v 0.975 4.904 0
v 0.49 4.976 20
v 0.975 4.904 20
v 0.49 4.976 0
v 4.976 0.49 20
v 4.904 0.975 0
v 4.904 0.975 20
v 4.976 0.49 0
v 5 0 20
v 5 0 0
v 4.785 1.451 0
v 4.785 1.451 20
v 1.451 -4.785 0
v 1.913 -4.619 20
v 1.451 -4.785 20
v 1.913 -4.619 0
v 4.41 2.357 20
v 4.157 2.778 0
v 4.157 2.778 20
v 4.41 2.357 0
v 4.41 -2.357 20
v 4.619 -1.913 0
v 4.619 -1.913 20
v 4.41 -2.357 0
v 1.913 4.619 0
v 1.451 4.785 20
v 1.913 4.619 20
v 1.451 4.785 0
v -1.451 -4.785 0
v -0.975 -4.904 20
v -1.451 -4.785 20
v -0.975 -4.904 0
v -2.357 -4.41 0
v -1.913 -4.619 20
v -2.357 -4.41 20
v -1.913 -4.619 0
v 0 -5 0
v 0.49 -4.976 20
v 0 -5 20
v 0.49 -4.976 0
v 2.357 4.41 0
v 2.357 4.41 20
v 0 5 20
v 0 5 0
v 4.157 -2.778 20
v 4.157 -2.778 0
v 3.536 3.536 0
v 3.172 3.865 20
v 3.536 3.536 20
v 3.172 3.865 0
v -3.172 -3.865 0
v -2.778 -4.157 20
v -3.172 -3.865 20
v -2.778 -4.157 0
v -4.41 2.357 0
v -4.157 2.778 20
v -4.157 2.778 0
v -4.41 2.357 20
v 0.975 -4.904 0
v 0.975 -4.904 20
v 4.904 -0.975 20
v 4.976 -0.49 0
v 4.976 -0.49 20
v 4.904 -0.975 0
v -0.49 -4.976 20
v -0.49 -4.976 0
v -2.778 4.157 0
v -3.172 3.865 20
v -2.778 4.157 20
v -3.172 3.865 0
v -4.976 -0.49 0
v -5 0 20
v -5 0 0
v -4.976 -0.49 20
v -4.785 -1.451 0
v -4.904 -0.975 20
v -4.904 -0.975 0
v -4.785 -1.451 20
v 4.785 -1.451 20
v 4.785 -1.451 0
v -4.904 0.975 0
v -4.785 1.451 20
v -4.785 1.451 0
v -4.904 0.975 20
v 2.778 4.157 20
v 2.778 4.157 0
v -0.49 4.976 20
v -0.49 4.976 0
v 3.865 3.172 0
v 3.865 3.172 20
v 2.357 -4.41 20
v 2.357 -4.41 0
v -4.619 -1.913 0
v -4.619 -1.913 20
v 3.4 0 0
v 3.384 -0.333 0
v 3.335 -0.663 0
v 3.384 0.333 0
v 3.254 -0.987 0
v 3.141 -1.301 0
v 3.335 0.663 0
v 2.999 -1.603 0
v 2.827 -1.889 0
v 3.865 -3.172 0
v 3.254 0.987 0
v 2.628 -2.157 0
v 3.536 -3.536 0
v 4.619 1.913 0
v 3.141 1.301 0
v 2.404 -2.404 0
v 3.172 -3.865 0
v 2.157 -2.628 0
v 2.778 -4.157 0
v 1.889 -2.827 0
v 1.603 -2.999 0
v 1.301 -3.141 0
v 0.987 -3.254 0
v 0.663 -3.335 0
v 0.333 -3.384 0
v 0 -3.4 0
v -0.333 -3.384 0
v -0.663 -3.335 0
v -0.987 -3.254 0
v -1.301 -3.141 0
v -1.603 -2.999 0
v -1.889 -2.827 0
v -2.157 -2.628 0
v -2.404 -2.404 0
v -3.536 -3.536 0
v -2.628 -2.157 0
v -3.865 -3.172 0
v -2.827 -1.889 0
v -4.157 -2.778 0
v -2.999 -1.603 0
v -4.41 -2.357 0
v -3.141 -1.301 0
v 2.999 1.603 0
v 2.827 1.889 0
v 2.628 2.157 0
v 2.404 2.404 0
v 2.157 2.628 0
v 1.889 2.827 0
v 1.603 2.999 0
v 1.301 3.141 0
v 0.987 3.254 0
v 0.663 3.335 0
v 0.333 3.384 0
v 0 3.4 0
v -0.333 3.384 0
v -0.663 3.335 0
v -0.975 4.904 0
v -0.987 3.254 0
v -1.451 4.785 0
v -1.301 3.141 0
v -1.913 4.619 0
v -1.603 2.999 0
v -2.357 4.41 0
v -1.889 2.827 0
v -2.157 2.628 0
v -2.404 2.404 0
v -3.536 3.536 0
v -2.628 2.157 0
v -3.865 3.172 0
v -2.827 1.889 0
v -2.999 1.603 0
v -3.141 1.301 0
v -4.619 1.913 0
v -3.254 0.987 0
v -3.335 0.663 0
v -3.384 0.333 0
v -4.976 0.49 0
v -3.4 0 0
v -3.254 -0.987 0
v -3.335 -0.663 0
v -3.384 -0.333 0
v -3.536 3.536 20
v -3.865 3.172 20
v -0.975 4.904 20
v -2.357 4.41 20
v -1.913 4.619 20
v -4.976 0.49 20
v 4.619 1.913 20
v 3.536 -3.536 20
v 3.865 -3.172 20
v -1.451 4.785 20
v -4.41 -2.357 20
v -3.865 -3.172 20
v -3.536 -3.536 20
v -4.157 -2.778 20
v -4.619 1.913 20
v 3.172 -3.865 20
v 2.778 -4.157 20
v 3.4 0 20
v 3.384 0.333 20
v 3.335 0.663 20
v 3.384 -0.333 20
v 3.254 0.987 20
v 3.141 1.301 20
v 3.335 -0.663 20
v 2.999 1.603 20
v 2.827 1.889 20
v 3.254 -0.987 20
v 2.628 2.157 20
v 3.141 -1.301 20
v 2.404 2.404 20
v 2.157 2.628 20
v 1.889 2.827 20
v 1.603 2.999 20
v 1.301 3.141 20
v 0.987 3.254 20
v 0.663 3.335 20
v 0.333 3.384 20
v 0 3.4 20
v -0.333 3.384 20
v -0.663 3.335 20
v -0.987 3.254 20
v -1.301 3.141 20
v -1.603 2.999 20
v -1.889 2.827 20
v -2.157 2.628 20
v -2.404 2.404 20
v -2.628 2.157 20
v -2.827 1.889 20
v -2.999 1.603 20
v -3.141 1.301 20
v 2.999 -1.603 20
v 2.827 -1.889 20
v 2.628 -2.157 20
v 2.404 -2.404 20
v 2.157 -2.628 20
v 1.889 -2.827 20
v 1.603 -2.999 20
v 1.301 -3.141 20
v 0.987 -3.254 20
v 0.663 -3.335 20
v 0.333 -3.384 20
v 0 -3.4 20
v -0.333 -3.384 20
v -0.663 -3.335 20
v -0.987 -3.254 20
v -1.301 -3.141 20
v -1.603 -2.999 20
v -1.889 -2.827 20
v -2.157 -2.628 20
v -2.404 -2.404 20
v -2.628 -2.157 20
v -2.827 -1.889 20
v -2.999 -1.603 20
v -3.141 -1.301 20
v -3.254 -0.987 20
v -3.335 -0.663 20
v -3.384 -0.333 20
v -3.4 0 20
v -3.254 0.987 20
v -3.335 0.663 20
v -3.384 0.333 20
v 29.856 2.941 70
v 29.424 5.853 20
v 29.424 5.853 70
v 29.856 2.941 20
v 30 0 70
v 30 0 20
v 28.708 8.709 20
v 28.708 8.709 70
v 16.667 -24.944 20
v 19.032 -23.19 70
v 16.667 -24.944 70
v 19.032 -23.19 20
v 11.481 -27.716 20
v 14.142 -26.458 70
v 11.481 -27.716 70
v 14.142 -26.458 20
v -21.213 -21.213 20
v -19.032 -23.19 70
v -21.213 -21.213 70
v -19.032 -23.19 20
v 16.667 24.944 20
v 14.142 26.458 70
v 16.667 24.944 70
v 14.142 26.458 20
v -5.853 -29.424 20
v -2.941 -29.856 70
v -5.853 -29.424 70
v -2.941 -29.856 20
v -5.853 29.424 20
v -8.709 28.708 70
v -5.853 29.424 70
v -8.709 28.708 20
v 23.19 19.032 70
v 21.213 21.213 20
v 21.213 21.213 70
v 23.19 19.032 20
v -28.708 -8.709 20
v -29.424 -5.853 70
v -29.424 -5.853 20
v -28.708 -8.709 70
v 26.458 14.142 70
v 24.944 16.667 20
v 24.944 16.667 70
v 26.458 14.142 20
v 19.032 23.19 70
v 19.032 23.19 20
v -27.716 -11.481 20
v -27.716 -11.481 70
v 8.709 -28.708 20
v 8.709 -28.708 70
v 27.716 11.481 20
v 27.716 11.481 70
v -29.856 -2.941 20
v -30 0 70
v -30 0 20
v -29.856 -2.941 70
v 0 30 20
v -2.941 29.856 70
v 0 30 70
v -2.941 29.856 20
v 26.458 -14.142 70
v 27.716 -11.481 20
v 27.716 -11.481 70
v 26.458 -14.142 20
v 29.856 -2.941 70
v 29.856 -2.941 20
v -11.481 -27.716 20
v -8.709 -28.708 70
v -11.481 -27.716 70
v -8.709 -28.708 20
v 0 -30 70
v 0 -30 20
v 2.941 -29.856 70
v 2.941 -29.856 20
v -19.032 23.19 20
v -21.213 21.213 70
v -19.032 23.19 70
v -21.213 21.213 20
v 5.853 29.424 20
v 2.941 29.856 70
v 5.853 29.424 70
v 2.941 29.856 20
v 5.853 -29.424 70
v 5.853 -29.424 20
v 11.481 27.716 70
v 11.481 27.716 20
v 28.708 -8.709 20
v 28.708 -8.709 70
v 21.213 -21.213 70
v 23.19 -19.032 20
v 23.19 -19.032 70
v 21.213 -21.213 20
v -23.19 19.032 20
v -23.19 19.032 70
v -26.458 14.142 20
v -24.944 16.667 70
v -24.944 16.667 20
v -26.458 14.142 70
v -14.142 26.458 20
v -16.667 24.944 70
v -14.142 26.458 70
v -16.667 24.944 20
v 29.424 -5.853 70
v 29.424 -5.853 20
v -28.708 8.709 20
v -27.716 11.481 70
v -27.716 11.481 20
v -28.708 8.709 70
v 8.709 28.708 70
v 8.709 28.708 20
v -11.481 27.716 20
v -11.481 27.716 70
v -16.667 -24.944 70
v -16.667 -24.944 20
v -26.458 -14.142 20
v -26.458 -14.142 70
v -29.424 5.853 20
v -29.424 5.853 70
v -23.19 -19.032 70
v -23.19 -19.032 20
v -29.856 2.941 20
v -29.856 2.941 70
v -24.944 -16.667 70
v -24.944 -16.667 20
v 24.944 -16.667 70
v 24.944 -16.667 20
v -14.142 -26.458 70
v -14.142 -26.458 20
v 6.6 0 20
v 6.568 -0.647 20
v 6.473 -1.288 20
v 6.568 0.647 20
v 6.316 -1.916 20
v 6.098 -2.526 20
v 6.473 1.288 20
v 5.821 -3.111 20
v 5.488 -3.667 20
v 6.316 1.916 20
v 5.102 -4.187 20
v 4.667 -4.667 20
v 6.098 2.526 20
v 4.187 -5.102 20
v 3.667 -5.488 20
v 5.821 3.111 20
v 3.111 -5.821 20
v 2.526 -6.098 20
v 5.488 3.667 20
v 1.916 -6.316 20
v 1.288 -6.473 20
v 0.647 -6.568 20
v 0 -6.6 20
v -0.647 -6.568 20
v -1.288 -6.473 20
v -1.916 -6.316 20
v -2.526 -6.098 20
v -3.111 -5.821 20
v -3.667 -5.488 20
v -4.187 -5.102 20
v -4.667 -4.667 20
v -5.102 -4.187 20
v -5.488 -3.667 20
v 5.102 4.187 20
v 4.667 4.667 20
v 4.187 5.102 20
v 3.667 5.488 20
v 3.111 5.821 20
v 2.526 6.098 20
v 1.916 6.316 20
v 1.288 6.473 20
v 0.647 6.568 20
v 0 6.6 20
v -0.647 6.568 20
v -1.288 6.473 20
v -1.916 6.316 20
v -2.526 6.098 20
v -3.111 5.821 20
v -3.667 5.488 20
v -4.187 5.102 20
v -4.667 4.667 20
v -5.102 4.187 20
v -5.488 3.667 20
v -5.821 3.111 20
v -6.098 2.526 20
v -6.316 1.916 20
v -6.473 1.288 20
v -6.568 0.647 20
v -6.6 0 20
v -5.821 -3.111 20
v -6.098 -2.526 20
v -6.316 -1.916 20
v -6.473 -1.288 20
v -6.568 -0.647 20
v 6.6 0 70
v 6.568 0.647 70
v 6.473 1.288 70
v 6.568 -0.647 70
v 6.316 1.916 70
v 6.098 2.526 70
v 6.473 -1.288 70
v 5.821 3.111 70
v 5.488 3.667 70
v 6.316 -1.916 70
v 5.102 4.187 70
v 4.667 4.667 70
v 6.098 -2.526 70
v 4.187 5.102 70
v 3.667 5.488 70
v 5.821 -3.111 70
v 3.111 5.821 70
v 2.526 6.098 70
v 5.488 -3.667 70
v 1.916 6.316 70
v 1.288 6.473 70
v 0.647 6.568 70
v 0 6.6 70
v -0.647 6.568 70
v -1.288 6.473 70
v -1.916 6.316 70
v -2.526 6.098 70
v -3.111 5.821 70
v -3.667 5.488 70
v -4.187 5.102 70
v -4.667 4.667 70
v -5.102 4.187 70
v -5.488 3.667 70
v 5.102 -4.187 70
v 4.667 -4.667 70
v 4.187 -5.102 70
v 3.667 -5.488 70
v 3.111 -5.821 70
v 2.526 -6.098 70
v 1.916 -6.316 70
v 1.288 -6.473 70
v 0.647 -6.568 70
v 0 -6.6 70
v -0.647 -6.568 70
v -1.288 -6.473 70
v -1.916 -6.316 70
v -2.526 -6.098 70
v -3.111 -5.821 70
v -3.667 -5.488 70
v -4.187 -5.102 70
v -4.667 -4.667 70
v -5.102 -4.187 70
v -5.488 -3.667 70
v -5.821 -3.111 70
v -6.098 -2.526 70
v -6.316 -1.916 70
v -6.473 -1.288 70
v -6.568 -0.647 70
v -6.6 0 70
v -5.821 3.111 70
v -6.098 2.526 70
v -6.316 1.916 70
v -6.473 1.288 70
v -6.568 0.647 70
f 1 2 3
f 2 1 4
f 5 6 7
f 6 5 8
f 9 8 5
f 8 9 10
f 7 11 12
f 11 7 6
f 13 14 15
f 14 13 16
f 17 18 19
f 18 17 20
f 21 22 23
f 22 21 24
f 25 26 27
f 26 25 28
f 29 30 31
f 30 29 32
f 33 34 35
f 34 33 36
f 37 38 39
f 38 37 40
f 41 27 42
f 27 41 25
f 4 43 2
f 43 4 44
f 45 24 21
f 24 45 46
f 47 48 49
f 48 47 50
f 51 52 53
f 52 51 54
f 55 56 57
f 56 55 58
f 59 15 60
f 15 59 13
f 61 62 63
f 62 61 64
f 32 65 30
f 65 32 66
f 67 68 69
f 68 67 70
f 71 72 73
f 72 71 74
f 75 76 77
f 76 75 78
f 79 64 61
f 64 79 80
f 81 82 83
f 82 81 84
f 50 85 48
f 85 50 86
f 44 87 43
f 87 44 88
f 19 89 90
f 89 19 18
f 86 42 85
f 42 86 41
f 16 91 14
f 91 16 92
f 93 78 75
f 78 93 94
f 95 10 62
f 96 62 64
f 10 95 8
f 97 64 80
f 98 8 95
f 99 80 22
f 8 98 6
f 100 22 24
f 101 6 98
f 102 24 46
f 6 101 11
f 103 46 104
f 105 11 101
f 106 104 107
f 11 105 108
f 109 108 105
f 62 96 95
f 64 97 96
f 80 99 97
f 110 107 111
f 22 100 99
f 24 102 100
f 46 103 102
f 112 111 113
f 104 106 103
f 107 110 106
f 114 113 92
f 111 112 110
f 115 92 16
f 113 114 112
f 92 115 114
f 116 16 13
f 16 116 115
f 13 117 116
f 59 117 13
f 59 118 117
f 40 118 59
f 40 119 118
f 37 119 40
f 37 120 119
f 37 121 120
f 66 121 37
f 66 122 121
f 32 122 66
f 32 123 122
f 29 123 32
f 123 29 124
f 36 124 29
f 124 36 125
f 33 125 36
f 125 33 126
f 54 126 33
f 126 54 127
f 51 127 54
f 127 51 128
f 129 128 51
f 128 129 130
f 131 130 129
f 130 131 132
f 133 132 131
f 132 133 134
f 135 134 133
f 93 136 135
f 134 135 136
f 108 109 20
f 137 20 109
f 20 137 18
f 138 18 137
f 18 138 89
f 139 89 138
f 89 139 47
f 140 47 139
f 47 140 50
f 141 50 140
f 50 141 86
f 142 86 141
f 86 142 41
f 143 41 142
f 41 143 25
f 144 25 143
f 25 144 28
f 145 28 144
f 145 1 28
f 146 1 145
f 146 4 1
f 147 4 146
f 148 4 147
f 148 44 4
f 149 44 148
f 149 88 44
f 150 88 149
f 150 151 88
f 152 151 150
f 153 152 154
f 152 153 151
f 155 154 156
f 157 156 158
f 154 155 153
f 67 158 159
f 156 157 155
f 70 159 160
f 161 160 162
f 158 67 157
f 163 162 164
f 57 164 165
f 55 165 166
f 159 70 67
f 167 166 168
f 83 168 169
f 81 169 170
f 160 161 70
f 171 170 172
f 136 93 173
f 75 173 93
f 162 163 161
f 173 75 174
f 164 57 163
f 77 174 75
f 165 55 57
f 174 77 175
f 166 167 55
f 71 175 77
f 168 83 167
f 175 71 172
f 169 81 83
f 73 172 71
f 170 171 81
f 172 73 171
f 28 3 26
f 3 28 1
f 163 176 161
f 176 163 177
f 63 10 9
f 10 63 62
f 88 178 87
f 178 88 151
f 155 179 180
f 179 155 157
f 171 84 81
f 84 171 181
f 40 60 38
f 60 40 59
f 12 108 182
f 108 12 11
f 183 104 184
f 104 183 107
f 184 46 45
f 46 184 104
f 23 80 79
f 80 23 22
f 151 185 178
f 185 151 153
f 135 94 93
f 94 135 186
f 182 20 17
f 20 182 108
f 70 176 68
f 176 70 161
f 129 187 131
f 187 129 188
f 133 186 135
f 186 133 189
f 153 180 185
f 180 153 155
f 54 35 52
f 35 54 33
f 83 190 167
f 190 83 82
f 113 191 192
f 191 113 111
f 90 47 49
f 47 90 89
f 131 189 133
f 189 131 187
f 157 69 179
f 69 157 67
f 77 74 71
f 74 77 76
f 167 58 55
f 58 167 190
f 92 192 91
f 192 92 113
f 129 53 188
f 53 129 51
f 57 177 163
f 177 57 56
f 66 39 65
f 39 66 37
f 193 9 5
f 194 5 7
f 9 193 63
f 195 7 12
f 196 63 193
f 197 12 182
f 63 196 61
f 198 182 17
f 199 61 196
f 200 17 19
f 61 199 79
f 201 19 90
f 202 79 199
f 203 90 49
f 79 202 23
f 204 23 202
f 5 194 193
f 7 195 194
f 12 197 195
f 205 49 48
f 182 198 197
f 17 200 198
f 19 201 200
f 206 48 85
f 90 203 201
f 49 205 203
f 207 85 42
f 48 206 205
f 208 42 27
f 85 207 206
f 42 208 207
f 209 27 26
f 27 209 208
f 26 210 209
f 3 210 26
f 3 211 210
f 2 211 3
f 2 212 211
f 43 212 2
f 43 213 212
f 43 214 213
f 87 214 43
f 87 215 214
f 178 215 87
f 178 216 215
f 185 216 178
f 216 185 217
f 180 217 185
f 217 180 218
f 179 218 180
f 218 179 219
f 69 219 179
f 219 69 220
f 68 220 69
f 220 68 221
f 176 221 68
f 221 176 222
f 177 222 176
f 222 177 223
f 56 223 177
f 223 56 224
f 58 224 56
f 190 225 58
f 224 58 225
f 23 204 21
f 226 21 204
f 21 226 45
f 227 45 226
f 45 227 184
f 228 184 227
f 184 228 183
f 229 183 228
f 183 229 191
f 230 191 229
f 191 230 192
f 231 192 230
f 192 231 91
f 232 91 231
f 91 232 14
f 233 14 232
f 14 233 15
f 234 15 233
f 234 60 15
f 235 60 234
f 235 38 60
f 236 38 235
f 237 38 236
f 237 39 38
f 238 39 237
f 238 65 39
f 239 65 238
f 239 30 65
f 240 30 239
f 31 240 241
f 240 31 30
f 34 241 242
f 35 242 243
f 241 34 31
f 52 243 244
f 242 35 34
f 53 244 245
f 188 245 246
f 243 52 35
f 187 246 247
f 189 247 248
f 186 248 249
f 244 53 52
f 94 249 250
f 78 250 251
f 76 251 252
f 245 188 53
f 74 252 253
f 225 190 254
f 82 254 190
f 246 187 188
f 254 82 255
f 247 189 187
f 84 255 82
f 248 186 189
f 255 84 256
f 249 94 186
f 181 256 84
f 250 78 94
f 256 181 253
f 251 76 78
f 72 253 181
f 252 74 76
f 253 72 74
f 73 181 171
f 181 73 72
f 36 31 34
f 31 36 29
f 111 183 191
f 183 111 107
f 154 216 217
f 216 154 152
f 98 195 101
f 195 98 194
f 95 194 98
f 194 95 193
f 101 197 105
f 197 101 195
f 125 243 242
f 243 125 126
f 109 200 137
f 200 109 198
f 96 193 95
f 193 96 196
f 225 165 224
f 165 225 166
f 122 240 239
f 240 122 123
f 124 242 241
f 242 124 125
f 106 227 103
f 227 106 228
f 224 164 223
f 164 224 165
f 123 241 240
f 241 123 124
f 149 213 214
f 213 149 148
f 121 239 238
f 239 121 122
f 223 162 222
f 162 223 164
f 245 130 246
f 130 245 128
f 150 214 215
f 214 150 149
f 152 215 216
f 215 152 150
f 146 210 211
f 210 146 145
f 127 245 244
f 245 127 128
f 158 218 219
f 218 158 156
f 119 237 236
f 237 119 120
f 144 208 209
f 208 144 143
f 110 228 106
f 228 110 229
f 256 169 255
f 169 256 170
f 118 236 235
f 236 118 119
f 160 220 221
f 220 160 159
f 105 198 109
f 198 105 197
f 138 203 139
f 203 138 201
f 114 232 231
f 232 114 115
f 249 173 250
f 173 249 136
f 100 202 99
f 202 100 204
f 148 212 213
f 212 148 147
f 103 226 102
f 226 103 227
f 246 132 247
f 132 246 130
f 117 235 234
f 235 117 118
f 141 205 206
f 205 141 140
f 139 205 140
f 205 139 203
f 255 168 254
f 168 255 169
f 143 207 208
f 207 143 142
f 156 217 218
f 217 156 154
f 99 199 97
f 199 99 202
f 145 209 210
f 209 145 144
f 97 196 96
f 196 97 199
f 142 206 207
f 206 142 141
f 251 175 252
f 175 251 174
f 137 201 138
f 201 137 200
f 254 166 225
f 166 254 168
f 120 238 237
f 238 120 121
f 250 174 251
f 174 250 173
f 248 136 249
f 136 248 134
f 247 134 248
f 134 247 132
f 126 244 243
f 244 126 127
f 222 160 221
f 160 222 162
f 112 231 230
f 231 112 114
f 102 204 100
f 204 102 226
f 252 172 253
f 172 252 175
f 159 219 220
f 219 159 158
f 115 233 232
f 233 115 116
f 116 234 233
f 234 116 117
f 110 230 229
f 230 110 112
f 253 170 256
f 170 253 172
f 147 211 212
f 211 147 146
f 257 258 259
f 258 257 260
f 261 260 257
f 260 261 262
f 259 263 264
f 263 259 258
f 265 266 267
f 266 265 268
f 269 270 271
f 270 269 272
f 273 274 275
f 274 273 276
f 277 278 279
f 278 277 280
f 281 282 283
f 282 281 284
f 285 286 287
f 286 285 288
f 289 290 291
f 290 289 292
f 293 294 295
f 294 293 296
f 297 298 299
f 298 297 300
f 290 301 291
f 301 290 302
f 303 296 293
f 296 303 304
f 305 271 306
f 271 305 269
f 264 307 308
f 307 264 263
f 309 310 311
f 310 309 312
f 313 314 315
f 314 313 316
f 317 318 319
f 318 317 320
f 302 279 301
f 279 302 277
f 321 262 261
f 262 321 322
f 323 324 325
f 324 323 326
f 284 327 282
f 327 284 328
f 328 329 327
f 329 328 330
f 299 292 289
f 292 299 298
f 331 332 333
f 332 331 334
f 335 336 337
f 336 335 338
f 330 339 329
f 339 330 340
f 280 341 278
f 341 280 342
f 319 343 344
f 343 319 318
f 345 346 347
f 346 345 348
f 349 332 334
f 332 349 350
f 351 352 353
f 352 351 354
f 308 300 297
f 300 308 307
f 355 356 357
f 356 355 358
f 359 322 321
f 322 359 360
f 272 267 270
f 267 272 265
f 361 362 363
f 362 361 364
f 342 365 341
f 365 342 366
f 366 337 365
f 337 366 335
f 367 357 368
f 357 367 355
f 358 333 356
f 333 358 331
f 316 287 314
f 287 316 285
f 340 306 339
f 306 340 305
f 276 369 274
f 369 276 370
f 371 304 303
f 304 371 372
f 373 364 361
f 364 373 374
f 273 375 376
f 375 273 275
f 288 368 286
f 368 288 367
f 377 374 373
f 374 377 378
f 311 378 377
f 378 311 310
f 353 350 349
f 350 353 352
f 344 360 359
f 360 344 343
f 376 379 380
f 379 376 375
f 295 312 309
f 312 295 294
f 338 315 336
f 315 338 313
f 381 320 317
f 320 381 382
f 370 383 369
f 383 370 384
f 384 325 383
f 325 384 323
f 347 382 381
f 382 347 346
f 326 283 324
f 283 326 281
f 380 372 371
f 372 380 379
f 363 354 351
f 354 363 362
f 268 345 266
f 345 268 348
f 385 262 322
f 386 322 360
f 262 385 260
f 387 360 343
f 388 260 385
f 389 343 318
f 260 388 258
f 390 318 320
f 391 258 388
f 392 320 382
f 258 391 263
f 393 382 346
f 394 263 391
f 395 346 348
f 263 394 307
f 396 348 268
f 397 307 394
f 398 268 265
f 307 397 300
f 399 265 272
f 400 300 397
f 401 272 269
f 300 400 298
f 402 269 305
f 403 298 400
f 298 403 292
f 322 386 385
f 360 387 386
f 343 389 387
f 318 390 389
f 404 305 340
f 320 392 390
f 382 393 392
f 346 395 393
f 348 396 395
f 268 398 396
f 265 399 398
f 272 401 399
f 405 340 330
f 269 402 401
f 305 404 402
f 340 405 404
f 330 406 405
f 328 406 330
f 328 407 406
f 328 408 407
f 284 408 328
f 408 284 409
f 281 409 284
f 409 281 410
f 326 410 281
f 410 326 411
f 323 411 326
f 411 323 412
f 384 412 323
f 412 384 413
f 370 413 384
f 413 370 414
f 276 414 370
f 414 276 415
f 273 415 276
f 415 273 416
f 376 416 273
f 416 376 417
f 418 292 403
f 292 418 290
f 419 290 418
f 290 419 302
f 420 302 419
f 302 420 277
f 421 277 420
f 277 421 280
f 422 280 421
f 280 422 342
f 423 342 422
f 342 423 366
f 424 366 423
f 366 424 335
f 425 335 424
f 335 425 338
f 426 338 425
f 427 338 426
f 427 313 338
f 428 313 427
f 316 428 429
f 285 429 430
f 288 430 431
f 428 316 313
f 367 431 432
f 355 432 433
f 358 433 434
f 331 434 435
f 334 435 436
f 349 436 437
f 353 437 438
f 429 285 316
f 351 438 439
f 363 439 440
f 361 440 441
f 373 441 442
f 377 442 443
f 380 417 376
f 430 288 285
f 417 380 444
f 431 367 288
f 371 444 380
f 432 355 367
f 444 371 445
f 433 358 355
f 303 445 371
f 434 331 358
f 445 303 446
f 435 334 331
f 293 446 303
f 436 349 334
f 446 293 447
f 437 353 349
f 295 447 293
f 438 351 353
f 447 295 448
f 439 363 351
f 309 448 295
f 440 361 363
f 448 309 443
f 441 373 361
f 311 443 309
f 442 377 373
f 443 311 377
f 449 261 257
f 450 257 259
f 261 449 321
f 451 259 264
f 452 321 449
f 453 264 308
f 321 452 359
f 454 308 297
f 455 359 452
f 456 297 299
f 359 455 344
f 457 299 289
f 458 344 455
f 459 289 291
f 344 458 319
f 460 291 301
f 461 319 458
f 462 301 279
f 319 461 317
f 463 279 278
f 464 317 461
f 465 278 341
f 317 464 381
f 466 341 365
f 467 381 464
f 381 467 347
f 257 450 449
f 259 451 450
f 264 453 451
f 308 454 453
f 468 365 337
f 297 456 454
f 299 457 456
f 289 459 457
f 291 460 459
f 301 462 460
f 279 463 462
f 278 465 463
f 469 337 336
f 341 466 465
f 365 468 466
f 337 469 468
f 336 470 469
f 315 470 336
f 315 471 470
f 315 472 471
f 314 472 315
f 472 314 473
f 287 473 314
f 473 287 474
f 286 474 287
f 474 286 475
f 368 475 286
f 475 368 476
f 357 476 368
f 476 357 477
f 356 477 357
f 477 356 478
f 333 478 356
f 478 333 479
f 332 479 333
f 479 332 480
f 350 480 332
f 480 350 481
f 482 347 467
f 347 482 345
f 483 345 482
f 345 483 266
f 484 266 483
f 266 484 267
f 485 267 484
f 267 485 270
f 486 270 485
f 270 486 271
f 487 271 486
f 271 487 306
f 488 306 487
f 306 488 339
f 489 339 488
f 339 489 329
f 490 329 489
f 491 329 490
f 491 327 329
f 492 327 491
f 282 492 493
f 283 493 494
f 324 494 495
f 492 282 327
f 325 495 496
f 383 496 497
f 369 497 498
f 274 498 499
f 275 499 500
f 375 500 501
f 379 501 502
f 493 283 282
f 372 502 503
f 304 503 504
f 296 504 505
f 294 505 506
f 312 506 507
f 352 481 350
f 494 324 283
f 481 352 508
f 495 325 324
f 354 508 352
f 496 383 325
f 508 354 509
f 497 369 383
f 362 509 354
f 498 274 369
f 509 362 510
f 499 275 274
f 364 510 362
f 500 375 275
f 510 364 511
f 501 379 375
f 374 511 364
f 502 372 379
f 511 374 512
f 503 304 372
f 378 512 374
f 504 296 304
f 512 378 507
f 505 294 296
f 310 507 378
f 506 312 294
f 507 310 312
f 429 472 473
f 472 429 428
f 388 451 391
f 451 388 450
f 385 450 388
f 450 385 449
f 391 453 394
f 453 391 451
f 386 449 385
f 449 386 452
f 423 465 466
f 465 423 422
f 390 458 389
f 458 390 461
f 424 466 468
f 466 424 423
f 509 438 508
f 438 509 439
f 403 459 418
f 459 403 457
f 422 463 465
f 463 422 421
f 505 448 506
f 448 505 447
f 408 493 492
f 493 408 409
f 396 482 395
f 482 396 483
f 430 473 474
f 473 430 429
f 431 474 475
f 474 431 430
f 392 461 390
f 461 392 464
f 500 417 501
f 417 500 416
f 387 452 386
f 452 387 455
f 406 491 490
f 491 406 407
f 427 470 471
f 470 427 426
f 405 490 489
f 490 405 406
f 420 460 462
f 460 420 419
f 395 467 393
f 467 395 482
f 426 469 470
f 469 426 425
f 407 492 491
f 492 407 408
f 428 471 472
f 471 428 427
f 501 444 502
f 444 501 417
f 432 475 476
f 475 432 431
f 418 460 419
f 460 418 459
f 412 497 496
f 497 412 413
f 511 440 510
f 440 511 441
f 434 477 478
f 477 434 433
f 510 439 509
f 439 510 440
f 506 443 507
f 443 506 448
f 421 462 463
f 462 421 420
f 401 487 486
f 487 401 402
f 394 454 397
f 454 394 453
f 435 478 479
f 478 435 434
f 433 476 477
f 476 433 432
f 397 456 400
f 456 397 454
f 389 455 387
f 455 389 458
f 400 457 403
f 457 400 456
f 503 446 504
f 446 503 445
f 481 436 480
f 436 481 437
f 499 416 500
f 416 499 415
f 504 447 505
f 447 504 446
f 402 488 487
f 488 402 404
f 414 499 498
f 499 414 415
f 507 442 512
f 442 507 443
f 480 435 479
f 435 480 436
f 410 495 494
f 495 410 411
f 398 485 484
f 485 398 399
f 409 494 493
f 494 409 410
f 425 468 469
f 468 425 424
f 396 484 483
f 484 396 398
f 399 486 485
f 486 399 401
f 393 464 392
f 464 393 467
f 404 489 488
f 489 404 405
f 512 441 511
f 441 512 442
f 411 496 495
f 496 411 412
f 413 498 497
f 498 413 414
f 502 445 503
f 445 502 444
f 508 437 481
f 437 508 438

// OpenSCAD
// Funnel - a spout (tube) with a conical section above, open at both ends. NOVEL general part.
//

spout_d  = 10;
spout_l  = 20;
cone_top = 10;
cone_rim = 60;
wall     = 1.6;

$fn = 64;

ib = max(1.6, spout_d - 2 * wall);   // keep a bore even if the wall is thicker than the wall

translate([0, 0, 0])
union() {
    difference() {
        cylinder(h = spout_l, d = spout_d);
        translate([0, 0, -1]) cylinder(h = spout_l + 2, d = ib);
    }
    translate([0, 0, spout_l])
    difference() {
        cylinder(h = cone_rim - cone_top, d = cone_rim);
        translate([0, 0, -1]) cylinder(h = cone_rim - cone_top + 2, d = cone_top + 2 * wall);
    }
}
